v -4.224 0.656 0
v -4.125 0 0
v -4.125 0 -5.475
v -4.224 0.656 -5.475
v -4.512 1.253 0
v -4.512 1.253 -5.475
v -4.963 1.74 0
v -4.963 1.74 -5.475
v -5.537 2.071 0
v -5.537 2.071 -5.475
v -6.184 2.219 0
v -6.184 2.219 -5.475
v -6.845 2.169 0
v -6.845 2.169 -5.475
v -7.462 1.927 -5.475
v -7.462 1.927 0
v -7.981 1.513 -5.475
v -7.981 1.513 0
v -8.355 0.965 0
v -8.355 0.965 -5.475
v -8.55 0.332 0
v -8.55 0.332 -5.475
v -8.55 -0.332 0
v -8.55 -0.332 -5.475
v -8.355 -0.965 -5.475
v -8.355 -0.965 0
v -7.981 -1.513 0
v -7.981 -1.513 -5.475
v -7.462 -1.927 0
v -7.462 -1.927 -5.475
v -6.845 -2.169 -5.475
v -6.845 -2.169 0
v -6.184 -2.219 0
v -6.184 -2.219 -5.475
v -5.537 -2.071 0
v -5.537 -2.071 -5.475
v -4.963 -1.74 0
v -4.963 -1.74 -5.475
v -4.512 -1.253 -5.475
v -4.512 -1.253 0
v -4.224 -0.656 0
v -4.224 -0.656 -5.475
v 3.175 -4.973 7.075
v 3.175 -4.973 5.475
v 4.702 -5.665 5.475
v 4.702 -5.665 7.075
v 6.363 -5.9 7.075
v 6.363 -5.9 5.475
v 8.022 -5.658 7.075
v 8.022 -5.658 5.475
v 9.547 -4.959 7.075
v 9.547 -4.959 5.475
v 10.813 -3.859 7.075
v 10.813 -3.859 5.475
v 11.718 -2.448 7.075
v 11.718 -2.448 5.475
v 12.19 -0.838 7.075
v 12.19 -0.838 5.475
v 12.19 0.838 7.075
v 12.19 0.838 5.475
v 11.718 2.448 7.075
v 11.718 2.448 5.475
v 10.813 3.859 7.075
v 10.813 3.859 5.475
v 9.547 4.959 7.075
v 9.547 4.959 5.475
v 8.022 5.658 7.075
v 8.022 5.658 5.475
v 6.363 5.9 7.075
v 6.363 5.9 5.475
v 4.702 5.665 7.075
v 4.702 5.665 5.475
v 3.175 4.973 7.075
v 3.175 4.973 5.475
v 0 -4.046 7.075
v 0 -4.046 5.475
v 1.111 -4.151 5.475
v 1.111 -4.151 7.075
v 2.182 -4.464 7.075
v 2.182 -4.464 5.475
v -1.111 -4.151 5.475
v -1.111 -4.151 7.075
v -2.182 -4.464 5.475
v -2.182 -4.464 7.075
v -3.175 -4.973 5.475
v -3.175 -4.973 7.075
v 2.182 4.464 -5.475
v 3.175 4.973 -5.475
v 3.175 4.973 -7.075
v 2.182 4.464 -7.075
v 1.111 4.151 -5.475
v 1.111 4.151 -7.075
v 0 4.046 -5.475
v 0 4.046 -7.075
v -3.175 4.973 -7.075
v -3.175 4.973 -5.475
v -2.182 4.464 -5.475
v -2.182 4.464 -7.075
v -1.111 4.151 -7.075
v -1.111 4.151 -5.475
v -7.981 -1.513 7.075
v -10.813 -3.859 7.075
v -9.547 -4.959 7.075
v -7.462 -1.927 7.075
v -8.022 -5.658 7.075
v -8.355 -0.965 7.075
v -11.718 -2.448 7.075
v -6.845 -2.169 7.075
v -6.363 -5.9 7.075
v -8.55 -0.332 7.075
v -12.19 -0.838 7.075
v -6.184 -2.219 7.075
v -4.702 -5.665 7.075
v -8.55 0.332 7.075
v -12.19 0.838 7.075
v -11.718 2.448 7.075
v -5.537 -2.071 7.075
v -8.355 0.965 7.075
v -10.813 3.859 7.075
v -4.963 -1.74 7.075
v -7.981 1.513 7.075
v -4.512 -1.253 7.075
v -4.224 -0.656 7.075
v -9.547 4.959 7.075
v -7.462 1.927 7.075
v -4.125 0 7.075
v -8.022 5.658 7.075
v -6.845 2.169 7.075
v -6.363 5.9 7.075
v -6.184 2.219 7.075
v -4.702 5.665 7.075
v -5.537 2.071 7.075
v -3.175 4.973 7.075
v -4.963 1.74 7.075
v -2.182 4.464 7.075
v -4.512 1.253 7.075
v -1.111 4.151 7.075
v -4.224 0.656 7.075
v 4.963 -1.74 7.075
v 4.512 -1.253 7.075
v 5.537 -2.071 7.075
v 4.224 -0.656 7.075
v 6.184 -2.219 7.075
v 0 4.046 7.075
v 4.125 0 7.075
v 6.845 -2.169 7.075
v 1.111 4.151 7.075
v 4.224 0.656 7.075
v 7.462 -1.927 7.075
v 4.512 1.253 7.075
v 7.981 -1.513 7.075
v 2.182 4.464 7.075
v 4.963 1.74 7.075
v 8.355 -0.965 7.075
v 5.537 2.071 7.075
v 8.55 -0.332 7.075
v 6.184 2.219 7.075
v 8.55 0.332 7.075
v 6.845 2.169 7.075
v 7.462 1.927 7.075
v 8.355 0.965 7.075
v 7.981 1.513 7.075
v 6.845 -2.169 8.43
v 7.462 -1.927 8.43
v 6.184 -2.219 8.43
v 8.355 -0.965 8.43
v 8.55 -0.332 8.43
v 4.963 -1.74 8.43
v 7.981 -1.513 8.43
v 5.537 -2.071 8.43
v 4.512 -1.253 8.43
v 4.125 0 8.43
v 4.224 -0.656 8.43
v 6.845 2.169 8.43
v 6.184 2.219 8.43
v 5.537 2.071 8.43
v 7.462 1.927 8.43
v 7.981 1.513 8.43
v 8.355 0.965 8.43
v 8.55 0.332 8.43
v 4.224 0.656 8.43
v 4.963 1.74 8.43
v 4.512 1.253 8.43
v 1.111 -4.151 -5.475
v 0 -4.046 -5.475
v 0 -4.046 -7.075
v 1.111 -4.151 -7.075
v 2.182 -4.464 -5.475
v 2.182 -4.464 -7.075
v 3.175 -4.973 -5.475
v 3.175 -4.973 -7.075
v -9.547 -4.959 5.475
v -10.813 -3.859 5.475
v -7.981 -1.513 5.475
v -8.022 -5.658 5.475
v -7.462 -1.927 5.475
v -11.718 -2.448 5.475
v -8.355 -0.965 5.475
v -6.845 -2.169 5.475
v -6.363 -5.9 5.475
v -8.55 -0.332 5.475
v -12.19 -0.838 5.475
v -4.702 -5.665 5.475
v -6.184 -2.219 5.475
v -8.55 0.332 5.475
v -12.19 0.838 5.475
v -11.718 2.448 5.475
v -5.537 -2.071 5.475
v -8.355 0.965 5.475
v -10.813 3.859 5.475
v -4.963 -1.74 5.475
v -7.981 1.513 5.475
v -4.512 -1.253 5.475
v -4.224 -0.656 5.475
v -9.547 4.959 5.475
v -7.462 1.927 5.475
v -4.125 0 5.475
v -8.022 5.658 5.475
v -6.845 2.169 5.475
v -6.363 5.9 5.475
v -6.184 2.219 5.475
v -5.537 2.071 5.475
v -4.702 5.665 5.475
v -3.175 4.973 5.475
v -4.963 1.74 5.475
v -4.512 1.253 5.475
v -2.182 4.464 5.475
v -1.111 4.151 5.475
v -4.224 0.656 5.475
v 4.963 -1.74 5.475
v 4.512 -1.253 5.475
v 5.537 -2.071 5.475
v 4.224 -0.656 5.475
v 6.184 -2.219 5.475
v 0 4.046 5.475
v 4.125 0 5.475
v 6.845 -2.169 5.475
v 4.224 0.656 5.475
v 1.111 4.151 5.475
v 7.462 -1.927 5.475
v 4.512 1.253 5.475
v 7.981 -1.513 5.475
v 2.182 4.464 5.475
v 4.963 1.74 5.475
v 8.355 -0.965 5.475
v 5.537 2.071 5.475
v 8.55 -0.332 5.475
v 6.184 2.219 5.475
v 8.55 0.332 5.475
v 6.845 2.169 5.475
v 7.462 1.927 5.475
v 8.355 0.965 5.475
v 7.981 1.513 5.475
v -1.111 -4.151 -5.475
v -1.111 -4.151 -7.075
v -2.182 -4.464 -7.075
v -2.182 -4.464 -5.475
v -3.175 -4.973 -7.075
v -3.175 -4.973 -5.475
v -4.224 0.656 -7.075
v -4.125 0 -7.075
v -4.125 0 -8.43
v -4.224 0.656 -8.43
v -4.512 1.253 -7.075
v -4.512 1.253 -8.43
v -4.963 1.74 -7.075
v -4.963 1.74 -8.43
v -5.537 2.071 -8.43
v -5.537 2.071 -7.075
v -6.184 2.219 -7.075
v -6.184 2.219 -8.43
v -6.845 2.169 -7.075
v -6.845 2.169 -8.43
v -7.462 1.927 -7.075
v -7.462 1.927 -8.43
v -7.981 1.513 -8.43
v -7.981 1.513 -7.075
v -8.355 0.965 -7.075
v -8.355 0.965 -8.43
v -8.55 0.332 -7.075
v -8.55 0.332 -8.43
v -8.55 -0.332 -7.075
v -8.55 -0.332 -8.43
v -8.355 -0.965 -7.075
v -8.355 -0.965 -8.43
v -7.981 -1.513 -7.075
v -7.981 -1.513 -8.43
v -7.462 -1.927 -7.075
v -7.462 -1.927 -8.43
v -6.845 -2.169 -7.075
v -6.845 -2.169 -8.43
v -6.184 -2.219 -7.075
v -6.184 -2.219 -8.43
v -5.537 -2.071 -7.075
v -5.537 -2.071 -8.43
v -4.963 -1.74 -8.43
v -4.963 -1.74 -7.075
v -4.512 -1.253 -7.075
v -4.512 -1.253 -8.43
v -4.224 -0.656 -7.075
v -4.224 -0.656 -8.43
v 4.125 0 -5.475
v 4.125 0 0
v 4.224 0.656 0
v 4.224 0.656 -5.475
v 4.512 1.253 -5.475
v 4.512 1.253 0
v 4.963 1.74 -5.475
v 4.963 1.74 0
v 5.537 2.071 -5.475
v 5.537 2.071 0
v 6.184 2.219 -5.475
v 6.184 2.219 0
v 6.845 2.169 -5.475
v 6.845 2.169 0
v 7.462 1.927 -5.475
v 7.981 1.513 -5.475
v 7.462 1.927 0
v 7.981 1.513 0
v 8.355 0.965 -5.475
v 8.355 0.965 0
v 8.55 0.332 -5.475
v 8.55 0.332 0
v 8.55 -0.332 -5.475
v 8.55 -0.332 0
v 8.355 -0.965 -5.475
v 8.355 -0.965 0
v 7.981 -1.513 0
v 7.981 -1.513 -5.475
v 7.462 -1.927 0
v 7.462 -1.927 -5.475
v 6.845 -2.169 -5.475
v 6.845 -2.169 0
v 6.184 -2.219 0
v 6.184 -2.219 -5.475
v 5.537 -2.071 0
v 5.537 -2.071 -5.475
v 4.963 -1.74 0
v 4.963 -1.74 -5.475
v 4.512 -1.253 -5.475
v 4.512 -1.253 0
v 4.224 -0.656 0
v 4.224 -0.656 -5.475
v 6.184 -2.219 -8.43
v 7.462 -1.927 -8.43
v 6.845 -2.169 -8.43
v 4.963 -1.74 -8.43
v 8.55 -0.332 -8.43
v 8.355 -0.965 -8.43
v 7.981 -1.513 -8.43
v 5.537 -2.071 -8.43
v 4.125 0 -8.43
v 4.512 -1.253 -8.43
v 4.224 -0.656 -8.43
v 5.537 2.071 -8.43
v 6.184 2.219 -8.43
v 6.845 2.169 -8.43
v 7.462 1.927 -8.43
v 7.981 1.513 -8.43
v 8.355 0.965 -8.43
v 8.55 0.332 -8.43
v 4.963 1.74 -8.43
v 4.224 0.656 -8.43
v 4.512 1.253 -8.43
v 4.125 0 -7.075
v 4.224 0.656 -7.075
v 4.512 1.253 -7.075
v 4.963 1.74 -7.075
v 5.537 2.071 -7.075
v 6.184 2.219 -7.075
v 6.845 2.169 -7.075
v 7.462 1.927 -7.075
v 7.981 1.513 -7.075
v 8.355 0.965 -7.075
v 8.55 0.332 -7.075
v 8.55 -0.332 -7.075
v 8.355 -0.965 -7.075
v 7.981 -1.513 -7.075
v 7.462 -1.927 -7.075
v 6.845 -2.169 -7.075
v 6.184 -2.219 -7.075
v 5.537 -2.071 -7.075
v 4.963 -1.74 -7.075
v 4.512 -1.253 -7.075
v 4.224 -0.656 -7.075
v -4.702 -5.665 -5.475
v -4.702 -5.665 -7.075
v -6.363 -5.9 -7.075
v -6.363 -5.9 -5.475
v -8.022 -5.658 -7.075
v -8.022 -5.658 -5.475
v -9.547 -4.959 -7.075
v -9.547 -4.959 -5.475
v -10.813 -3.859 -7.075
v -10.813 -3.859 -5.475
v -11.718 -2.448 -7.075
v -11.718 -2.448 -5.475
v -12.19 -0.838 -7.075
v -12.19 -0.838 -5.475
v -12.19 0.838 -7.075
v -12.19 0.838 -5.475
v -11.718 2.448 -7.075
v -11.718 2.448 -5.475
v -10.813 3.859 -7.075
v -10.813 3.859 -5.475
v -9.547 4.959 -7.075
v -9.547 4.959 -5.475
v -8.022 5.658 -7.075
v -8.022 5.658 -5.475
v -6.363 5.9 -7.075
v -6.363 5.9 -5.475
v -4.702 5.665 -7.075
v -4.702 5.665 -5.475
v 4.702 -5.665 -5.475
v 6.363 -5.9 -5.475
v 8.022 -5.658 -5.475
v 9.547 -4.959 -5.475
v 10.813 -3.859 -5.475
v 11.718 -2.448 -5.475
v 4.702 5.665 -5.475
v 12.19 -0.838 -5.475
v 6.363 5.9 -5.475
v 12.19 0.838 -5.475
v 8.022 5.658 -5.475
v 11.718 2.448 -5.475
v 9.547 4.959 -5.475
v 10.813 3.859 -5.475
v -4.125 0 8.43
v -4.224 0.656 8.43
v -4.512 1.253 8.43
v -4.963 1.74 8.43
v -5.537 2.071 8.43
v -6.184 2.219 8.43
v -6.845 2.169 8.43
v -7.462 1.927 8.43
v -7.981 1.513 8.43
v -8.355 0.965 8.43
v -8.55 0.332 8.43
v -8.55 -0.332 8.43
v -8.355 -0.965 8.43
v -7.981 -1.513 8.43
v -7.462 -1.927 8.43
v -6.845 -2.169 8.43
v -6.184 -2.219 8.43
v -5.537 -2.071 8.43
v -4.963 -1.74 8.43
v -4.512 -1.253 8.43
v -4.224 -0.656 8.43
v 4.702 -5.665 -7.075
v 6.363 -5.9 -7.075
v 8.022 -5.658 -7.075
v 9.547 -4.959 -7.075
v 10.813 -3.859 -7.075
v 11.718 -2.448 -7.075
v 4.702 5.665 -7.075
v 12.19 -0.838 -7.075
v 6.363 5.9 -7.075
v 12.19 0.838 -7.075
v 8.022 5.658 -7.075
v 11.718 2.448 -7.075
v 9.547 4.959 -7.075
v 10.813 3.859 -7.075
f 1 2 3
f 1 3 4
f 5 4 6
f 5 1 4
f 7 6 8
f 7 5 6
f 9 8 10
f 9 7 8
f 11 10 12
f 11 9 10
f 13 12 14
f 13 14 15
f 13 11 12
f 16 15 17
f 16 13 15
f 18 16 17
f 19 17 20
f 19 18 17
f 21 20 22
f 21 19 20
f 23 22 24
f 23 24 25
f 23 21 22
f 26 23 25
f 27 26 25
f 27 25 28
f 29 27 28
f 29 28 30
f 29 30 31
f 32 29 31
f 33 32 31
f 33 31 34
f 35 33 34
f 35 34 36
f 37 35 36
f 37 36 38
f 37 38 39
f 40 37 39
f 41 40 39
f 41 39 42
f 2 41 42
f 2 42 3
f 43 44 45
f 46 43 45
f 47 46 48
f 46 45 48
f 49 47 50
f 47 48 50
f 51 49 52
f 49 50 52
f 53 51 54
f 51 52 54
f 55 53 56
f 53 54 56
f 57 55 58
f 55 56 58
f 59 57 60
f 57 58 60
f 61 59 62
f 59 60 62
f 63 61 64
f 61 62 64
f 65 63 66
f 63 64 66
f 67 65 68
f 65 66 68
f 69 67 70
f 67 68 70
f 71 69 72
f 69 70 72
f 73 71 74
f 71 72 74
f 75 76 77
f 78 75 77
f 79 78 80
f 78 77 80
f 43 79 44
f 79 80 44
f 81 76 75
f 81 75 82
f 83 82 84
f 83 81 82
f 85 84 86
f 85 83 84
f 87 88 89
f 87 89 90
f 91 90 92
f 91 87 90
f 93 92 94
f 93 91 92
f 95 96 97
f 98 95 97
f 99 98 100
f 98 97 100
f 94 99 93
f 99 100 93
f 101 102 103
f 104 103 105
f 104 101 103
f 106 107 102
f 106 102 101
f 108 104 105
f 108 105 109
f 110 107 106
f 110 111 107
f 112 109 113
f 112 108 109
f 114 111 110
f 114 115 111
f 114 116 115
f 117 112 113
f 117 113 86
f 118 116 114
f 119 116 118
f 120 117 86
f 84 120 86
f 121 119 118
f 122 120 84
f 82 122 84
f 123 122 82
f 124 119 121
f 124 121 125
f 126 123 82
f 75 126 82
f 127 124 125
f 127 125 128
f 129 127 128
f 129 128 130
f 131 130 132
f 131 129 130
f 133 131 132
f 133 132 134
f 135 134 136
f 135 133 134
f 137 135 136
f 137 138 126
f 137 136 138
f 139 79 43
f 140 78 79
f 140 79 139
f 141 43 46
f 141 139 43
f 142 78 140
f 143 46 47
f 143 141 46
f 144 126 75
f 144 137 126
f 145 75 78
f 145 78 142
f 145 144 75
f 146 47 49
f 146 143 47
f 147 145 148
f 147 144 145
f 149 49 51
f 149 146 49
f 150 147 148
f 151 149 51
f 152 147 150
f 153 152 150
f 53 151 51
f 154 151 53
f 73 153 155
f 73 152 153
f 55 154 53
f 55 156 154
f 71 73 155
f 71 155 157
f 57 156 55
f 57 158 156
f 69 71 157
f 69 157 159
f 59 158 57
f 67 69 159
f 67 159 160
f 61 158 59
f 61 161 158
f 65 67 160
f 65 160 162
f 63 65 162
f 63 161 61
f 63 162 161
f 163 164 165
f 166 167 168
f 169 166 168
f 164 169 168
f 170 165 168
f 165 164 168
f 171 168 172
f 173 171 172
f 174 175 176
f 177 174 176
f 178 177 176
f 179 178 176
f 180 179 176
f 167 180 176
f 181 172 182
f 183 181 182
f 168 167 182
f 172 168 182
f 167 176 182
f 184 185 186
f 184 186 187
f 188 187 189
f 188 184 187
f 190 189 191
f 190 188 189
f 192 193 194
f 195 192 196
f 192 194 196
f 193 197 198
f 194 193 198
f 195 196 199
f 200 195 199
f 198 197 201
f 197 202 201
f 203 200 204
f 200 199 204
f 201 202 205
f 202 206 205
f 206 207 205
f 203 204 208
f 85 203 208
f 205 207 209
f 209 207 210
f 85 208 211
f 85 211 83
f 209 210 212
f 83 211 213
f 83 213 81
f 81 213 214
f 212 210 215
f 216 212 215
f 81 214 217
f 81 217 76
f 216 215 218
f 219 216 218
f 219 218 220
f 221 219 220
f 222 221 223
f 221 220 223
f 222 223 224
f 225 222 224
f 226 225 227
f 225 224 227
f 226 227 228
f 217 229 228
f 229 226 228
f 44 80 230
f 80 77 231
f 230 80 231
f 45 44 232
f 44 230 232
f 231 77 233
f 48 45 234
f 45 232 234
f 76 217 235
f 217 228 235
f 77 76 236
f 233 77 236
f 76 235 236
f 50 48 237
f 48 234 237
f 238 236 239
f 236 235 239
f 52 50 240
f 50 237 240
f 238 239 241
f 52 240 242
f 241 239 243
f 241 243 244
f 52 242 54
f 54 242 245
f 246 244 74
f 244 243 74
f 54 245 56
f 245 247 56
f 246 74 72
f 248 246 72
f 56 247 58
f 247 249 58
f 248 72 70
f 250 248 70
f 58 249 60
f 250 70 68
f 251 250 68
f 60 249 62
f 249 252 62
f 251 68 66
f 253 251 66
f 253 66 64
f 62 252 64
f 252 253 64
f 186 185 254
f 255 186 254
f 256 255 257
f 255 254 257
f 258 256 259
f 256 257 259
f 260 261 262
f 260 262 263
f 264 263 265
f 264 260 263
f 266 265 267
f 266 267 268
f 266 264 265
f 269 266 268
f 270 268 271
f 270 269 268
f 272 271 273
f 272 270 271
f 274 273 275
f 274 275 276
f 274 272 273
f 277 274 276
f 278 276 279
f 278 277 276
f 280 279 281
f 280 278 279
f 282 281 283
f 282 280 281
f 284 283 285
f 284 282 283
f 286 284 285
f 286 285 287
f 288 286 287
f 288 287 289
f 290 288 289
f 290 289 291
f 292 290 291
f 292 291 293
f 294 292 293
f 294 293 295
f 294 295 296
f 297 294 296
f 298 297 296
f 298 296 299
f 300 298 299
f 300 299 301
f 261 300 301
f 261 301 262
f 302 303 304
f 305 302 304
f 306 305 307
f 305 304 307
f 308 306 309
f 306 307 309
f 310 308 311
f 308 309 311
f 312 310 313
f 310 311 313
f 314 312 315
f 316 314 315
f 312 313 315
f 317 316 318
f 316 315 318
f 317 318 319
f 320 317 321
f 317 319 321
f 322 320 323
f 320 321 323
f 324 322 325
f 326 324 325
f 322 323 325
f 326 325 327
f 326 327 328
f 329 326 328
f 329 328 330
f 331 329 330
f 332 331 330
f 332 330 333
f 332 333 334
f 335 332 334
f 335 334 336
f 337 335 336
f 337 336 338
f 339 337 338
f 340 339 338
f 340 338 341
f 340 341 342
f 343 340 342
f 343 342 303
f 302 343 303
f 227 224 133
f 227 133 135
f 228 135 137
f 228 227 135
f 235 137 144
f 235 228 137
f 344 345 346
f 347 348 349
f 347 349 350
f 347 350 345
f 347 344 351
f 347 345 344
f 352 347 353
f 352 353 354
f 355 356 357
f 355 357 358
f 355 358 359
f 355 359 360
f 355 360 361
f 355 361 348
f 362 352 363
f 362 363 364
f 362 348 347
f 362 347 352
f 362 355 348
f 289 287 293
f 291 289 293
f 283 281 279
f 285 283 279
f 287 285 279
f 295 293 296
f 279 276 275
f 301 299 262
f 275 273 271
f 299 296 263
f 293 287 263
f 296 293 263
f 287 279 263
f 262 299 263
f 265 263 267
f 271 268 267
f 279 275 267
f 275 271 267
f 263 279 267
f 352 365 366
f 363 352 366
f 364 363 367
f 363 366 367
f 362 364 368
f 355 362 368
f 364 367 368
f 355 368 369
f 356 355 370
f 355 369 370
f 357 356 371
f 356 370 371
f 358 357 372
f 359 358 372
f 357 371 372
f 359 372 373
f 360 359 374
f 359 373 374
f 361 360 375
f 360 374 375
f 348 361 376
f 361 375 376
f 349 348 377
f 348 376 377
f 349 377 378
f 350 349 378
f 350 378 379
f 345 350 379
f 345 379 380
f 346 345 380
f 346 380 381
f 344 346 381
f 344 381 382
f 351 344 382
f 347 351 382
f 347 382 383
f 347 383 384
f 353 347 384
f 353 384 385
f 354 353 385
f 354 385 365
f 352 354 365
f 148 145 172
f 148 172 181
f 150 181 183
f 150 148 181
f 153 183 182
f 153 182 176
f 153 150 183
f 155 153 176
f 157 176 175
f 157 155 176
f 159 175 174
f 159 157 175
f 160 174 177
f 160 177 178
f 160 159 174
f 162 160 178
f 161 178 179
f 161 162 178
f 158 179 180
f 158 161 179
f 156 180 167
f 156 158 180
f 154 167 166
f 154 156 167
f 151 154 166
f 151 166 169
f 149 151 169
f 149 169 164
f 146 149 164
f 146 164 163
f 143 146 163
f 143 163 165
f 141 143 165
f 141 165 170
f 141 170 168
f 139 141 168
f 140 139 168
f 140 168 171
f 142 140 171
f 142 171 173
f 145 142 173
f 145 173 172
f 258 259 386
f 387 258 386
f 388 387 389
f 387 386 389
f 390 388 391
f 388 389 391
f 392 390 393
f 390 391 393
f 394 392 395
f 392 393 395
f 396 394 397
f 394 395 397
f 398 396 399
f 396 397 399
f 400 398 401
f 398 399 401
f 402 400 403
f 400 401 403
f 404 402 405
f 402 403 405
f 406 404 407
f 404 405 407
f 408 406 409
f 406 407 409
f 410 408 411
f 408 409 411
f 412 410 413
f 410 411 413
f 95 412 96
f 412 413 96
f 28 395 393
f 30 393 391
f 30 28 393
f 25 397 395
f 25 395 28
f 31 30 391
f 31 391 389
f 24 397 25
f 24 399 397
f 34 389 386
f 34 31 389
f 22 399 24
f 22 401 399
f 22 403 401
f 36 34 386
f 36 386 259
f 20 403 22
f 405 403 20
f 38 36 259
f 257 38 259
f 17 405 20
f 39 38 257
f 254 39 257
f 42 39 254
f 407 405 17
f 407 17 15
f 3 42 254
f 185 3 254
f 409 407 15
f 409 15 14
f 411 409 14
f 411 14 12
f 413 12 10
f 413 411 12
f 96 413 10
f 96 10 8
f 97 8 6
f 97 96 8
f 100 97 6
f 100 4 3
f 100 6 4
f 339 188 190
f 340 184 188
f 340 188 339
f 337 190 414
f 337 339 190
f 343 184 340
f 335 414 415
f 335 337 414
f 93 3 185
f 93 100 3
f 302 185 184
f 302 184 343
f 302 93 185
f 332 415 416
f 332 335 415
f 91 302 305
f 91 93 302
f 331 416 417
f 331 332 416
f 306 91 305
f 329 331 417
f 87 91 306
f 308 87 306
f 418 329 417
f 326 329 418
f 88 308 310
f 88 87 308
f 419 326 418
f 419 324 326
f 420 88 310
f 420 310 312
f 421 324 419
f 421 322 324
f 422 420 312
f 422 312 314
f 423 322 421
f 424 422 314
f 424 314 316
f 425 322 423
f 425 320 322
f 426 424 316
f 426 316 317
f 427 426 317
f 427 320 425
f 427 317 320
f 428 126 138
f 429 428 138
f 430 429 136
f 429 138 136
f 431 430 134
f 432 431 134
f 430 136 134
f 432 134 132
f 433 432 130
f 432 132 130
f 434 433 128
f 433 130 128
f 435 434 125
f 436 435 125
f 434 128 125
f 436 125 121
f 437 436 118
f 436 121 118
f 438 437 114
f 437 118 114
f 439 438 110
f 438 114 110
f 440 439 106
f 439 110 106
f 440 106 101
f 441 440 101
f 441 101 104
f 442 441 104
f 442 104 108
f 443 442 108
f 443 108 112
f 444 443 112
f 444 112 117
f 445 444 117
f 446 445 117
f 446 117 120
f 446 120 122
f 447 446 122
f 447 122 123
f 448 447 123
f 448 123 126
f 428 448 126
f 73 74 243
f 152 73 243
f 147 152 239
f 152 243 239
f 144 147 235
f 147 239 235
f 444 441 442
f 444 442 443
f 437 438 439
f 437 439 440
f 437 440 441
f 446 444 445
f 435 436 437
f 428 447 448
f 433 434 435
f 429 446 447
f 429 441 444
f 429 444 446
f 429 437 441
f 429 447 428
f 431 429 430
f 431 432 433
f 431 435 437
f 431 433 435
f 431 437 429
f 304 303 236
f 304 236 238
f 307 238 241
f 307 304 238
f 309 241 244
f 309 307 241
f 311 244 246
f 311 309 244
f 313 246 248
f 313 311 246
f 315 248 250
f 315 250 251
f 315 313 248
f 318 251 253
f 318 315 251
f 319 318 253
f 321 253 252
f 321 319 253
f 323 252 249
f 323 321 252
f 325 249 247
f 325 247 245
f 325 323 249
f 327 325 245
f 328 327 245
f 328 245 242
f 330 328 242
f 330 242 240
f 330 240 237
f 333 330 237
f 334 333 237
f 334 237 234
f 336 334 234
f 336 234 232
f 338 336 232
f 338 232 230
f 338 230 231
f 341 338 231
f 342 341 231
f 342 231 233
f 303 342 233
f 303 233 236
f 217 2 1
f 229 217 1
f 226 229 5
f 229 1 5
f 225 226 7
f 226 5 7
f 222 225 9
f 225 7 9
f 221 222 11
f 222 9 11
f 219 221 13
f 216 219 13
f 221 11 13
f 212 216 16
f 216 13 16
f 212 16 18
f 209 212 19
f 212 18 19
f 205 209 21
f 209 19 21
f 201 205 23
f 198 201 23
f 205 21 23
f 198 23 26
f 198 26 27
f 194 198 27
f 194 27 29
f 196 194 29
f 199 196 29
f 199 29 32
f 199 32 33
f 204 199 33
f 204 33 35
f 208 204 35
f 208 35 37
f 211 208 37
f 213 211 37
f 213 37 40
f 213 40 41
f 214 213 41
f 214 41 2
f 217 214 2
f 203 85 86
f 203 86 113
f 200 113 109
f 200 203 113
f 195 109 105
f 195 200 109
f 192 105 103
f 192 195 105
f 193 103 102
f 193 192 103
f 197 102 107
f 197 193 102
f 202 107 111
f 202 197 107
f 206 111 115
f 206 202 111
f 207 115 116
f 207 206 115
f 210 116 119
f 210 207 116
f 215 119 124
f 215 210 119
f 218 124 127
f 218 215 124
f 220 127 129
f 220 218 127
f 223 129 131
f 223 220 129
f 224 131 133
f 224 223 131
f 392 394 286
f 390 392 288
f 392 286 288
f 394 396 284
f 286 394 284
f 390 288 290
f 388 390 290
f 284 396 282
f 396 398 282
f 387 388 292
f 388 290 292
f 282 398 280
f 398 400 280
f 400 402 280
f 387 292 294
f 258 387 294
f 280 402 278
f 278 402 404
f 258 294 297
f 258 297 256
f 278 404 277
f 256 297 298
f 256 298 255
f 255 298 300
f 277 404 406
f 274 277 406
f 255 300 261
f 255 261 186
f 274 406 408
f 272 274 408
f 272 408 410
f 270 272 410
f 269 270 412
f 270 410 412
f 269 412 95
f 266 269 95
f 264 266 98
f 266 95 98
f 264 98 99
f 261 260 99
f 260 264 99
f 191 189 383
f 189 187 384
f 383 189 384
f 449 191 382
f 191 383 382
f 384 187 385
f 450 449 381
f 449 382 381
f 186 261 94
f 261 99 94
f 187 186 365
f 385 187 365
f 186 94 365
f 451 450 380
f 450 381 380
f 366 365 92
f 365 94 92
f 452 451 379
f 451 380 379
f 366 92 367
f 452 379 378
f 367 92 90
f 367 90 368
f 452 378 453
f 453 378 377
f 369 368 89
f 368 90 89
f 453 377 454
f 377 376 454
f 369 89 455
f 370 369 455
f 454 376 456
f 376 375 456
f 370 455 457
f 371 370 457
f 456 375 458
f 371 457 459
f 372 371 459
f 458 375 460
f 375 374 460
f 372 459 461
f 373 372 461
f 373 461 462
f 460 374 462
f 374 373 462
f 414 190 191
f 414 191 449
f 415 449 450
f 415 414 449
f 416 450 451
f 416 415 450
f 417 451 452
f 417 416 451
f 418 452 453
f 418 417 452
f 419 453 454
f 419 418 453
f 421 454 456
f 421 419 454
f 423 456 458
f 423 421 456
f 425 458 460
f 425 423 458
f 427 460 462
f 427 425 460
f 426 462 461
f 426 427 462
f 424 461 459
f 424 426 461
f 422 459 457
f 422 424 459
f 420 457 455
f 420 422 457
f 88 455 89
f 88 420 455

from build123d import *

# Parameters (mm, degrees)
EXTRUDE_START   = -5.475
EXTRUDE_1_DEPTH = 1.6
SKETCH_1_3_R    = 2.225
EXTRUDE_2_DEPTH = 8.43


with BuildPart() as part:
    # Эскиз1 → Бобышка-Вытянуть1 (new body)
    with BuildSketch(Plane.XY.offset(EXTRUDE_START)):
        with BuildLine():
            Line((0, 4.045727726), (0, -4.045727726))
            ThreePointArc((0, -4.045727726), (-1.653799143, -4.282252786), (-3.175, -4.972863863))
            ThreePointArc((-3.175, -4.972863863), (-12.25, 0), (-3.175, 4.972863863))
            ThreePointArc((-3.175, 4.972863863), (-1.653799143, 4.282252786), (0, 4.045727726))
        make_face()
    extrude(amount=-EXTRUDE_1_DEPTH)

    # Эскиз1<3> → Бобышка-Вытянуть2 (add)
    with BuildSketch(Plane.XY):
        with Locations((-6.35, 0)):
            Circle(SKETCH_1_3_R)
    extrude(amount=-EXTRUDE_2_DEPTH)

    # Зеркальное отражение1: part across plane


with BuildPart() as part_1:
    add(part.part)
    add(part.part.mirror(Plane(origin=(0, 0, 0), x_dir=(0, 0, 1), z_dir=(1, 0, 0))))

    # Зеркальное отражение2: part across plane


with BuildPart() as part_2:
    add(part_1.part)
    add(part_1.part.mirror(Plane.XY))


solid = part_2.part
